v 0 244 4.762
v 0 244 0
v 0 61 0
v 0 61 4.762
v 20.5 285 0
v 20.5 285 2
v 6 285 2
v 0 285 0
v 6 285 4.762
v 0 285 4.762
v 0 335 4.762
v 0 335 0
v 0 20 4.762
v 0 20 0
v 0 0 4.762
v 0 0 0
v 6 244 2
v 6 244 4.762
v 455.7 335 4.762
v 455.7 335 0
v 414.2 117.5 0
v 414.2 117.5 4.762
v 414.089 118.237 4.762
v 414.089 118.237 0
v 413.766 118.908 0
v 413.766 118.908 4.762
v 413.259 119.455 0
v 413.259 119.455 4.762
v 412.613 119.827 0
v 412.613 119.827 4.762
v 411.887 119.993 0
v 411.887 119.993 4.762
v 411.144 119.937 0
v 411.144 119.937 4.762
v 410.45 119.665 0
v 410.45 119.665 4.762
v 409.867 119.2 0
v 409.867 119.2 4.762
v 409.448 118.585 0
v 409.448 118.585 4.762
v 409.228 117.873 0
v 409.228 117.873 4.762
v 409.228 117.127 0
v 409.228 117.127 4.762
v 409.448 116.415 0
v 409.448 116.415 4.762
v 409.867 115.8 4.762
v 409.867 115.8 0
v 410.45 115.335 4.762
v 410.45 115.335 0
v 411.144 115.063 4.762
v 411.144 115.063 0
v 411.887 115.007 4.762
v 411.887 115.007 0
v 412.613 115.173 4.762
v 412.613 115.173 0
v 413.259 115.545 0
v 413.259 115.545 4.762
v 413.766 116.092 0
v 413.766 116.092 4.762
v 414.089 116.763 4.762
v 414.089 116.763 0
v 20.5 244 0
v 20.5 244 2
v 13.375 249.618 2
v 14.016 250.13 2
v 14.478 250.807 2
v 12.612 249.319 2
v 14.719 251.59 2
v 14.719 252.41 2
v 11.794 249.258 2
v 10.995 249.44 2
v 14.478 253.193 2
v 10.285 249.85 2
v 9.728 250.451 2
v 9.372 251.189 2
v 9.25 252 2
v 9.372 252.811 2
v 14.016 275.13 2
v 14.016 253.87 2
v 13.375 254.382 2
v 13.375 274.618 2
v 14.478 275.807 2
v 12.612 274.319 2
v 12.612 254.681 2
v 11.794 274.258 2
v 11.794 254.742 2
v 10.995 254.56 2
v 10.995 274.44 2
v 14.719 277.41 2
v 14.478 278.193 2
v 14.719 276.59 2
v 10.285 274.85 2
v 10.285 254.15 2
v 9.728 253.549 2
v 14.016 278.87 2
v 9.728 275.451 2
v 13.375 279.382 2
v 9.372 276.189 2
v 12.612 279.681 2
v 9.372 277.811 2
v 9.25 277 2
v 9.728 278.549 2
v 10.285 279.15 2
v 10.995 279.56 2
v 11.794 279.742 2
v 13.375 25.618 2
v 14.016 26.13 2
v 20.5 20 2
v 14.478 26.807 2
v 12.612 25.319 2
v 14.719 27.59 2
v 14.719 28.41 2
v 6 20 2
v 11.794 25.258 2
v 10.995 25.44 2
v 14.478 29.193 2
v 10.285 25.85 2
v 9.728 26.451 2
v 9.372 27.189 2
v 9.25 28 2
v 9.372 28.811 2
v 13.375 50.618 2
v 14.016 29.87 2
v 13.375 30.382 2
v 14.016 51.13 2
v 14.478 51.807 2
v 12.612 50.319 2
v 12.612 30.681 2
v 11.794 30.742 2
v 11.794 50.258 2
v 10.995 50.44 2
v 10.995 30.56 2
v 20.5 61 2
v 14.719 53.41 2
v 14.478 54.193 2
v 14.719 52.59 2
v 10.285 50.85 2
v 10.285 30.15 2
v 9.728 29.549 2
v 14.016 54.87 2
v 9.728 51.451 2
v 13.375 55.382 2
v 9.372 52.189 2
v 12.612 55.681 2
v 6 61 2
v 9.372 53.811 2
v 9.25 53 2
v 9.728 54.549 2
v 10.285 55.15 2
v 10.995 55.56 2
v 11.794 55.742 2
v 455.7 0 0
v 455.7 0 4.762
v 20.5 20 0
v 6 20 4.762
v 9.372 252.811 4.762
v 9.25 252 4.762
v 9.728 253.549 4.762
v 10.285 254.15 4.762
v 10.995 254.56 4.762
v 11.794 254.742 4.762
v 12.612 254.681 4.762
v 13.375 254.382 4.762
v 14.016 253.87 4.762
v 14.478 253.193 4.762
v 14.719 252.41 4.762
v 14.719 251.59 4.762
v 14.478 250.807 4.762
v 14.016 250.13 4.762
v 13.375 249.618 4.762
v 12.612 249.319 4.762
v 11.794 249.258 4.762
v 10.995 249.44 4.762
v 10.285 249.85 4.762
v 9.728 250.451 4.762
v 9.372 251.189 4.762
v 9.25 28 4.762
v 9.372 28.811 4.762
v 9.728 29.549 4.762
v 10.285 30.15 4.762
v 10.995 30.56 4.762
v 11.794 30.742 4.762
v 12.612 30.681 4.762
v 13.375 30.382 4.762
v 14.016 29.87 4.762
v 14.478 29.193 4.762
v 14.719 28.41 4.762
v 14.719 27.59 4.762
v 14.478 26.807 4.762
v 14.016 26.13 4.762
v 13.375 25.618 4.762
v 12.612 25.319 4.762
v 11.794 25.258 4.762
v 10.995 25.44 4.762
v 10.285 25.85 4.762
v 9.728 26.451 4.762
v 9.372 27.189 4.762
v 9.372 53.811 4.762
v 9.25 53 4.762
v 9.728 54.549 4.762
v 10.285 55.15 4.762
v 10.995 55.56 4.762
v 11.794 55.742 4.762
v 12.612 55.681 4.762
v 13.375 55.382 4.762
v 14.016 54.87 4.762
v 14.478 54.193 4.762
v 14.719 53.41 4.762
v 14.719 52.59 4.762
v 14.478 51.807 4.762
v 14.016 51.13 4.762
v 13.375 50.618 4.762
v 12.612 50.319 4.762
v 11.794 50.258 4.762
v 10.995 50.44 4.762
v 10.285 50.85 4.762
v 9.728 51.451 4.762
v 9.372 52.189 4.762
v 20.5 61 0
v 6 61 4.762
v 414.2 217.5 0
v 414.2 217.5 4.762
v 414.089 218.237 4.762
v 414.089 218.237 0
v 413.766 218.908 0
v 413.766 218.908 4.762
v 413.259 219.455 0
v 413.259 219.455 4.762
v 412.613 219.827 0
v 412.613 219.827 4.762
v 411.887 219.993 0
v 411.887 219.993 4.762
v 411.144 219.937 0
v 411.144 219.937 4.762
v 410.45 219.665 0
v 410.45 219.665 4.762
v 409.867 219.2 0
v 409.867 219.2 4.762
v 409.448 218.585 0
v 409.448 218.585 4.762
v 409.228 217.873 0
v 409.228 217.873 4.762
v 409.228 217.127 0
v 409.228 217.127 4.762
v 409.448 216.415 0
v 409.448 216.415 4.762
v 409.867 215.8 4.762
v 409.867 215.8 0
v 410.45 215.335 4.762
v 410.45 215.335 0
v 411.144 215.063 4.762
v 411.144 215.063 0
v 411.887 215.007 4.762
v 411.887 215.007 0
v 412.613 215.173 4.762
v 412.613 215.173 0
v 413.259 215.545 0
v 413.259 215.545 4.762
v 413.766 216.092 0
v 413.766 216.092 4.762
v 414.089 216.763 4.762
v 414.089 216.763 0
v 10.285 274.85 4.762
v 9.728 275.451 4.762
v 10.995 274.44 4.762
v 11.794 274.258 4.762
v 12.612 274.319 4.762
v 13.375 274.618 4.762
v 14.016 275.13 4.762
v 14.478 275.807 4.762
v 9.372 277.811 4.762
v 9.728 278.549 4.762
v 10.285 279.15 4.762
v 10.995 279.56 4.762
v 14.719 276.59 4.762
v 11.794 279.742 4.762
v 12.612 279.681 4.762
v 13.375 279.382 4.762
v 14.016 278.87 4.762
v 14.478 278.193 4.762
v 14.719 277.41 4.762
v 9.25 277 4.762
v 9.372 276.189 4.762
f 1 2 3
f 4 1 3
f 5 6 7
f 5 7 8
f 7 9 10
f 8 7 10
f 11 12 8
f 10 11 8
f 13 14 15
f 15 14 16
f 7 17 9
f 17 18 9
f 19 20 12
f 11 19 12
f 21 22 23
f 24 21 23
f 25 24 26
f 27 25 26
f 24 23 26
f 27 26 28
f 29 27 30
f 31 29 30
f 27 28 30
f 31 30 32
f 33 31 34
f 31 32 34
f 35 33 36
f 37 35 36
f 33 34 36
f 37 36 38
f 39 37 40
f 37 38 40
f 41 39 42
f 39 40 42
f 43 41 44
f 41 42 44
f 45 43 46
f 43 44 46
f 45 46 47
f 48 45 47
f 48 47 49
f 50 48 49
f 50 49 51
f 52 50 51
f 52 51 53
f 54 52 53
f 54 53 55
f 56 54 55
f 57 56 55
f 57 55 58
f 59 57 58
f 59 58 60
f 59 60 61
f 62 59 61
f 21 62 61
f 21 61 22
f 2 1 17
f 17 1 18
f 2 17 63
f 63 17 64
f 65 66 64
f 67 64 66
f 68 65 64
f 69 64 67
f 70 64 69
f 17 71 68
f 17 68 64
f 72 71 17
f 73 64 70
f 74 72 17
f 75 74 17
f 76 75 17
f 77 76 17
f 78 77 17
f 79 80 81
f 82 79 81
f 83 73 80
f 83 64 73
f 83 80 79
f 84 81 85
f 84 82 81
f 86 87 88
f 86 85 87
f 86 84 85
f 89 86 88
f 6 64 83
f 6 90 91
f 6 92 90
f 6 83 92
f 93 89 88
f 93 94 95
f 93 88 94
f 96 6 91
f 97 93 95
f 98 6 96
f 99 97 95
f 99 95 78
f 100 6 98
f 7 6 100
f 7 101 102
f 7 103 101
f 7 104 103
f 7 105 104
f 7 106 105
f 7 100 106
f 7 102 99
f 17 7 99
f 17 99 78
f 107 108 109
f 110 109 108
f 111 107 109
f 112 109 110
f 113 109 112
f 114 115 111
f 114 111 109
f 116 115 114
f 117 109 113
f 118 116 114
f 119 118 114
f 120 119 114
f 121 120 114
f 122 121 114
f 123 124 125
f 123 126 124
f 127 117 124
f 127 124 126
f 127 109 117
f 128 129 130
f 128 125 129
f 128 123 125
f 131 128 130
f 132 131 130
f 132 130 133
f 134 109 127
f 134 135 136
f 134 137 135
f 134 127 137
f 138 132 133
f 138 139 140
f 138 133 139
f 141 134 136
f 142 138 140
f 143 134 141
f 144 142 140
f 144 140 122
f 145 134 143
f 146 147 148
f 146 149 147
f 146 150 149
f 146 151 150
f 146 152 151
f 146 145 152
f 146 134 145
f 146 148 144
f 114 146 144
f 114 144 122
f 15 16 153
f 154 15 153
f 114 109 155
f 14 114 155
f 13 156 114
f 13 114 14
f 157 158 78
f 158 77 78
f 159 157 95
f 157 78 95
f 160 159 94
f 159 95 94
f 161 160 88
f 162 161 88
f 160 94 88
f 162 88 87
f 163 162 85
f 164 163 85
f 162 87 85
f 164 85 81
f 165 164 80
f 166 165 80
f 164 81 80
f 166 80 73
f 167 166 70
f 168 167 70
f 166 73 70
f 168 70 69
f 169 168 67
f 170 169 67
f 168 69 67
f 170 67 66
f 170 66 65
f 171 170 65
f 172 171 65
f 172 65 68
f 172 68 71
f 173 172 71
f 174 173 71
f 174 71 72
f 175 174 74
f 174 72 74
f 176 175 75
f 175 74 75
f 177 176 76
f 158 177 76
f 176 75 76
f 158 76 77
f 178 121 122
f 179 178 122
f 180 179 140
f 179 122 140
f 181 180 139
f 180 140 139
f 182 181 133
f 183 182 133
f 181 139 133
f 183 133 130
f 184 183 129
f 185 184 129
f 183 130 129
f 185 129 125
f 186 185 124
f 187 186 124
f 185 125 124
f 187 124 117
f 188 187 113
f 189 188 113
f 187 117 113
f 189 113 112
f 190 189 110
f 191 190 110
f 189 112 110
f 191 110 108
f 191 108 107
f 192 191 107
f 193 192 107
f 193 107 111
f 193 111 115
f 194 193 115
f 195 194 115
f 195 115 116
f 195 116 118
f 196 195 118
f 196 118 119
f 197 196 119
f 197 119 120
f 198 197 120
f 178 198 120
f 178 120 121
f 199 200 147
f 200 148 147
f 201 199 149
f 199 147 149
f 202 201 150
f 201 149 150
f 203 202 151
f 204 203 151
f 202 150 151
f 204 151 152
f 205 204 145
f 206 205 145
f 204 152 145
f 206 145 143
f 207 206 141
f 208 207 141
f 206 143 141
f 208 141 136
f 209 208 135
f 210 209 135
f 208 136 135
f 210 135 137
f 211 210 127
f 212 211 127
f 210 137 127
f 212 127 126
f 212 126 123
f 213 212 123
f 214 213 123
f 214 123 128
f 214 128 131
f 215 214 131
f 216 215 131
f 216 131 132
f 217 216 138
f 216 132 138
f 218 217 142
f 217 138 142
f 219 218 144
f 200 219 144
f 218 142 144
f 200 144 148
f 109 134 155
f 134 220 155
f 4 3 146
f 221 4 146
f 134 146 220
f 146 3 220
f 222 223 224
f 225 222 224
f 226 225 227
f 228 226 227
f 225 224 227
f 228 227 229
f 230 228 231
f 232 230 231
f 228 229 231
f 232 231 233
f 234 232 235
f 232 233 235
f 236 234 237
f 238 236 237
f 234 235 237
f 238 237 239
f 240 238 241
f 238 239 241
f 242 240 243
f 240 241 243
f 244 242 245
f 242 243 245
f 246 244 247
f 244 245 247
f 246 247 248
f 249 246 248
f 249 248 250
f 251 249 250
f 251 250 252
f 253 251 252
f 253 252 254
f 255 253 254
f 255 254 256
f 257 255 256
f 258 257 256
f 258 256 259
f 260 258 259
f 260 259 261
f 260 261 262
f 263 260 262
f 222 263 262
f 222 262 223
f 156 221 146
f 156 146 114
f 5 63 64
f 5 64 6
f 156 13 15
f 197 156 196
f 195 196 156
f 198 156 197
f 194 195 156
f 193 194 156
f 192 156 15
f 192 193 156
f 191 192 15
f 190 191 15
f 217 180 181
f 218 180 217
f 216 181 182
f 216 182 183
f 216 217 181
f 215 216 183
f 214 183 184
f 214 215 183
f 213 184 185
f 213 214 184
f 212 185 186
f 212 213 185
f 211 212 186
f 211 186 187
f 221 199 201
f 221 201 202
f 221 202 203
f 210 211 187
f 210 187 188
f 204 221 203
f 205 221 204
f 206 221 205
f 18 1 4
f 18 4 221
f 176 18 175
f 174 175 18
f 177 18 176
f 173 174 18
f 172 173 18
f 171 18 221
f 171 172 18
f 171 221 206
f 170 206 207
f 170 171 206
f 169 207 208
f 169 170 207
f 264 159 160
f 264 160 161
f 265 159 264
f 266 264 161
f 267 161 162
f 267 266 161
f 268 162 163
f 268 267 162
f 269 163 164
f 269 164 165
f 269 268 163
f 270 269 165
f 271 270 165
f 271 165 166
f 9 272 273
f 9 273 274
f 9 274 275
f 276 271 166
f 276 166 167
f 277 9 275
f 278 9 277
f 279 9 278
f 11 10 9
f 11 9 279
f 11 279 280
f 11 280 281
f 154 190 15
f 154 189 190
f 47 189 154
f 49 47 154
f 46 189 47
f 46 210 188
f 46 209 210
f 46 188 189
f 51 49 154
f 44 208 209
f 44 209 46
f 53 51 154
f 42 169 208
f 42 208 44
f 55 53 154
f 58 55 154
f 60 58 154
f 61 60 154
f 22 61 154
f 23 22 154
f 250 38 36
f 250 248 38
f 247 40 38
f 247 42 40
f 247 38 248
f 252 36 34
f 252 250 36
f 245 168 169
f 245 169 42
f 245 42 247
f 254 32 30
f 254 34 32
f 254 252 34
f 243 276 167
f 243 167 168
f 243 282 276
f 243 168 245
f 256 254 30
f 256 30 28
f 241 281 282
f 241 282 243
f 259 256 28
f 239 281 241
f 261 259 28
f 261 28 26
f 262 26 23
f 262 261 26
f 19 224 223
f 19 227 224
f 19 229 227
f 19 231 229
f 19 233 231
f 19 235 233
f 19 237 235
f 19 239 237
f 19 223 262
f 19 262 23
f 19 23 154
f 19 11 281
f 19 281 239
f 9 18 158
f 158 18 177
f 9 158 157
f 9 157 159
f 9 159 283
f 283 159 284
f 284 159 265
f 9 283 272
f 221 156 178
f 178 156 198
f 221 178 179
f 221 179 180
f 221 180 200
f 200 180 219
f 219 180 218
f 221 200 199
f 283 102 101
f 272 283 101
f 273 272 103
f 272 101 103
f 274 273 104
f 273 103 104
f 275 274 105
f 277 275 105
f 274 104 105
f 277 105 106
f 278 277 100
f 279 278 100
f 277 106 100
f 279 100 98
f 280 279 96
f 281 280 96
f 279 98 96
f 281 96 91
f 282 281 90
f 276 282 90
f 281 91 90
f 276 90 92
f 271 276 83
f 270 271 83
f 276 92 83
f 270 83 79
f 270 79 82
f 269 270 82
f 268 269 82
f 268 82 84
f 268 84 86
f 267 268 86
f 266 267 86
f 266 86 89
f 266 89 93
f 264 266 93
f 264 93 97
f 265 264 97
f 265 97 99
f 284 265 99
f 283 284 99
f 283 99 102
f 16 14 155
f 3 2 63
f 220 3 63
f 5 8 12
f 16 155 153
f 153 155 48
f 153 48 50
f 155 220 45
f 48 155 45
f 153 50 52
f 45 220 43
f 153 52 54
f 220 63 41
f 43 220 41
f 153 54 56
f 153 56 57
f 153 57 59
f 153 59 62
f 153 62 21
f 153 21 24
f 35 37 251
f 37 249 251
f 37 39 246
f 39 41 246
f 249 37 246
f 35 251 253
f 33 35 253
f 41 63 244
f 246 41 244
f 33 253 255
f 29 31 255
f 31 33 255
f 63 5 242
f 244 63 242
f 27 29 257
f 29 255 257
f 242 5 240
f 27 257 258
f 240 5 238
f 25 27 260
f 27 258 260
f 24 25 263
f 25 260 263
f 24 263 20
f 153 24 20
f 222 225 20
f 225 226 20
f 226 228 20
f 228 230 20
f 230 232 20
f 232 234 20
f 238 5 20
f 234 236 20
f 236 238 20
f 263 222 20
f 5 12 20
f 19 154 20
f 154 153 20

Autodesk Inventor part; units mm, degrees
ref_plane "YZ Plane" through (0, 0, 0) normal (1, 0, 0) x (0, 1, 0)
ref_plane "XZ Plane" through (0, 0, 0) normal (0, 1, 0) x (-1, 0, 0)
ref_plane "XY Plane" through (0, 0, 0) normal (0, 0, 1) x (1, 0, 0)
sketch "Sketch1" plane through (0, 0, 0) normal (0, 0, 1) x (1, 0, 0)
  line L0 (0, 0) -> (455.7, 0)
  line L1 (455.7, 0) -> (455.7, 335)
  line L2 (455.7, 335) -> (0, 335)
  line L3 (0, 335) -> (0, 0)
  dimension "d0" = 455.7
  dimension "d1" = 335
extrude "Extrusion1" add sketch "Sketch1" along normal blind 4.7625
sketch "Sketch3" plane through (0, 0, 4.7625) normal (0, 0, 1) x (1, 0, 0)
  line L0 (0, 0) -> (455.7, 0) projected
  line L1 (0, 335) -> (0, 0) projected
  line L2 (0, 61) -> (6, 61)
  line L3 (6, 61) -> (6, 20)
  line L4 (455.7, 335) -> (0, 335) projected
  line L5 (0, 244) -> (6, 244)
  line L6 (6, 244) -> (6, 285)
  line L7 (6, 285) -> (0, 285)
  line L8 (6, 20) -> (0, 20)
  dimension "d11" = 41
  dimension "d12" = 6
  dimension "d15" = 41
  dimension "d16" = 6
  dimension "d27" = 50
  dimension "d28" = 20
extrude "Extrusion3" cut sketch "Sketch3" against normal up to next
sketch "Sketch4" plane through (0, 0, 0) normal (0, 0, -1) x (-1, 0, 0)
  line L0 (-6, 244) -> (-6, 285) projected
  line L1 (-455.7, 335) -> (0, 335) projected
  line L2 (0, 0) -> (-455.7, 0) projected
  line L3 (-6, 20) -> (-6, 61) projected
  line L4 (-6, 244) -> (-20.5, 244)
  line L5 (-20.5, 244) -> (-20.5, 285)
  line L6 (-6, 61) -> (-20.5, 61)
  line L7 (-20.5, 61) -> (-20.5, 20)
  line L8 (-6, 285) -> (-20.5, 285)
  line L9 (-20.5, 20) -> (-6, 20)
  point P0 (-6, 335)
  point P1 (-6, 0)
  dimension "d17" = 14.5
  dimension "d18" = 14.5
extrude "Extrusion4" cut sketch "Sketch4" against normal blind 2
sketch "Sketch5" plane through (0, 0, 4.7625) normal (0, 0, 1) x (1, 0, 0)
  line L0 (455.7, 0) -> (455.7, 335) projected
  line L1 (455.7, 335) -> (0, 335) projected
  circle A0 centre (411.7, 217.5) radius 2.5
  circle A1 centre (411.7, 117.5) radius 2.5
  point P0 (6, 335)
  dimension "d21" = 5
  dimension "d22" = 100
  dimension "d23" = 117.5
  dimension "d24" = 44
extrude "Extrusion5" cut sketch "Sketch5" against normal up to next
sketch "Sketch6" plane through (0, 0, 2) normal (0, 0, -1) x (-1, 0, 0)
  line L0 (-20.5, 285) -> (-6, 285) projected
  line L1 (-6, 244) -> (-20.5, 244) projected
  line L2 (-6, 61) -> (-6, 20) projected
  line L3 (-20.5, 61) -> (-6, 61) projected
  line L4 (-20.5, 20) -> (-20.5, 61) projected
  line L5 (-6, 20) -> (-20.5, 20) projected
  circle A0 centre (-12, 277) radius 2.75
  circle A1 centre (-12, 252) radius 2.75
  circle A2 centre (-12, 53) radius 2.75
  circle A3 centre (-12, 28) radius 2.75
  point P0 (0, 0)
  dimension "d29" = 5.5
  dimension "d30" = 5.5
  dimension "d31" = 5.5
  dimension "d32" = 5.5
  dimension "d34" = 8
  dimension "d35" = 8
  dimension "d36" = 8.5
  dimension "d37" = 8
  dimension "d38" = 8
extrude "Extrusion6" cut sketch "Sketch6" against normal up to next contours A0 | A1 | A2 | A3
properties part number "EnclosureDoorFront" material "Polycarbonate, Clear"
